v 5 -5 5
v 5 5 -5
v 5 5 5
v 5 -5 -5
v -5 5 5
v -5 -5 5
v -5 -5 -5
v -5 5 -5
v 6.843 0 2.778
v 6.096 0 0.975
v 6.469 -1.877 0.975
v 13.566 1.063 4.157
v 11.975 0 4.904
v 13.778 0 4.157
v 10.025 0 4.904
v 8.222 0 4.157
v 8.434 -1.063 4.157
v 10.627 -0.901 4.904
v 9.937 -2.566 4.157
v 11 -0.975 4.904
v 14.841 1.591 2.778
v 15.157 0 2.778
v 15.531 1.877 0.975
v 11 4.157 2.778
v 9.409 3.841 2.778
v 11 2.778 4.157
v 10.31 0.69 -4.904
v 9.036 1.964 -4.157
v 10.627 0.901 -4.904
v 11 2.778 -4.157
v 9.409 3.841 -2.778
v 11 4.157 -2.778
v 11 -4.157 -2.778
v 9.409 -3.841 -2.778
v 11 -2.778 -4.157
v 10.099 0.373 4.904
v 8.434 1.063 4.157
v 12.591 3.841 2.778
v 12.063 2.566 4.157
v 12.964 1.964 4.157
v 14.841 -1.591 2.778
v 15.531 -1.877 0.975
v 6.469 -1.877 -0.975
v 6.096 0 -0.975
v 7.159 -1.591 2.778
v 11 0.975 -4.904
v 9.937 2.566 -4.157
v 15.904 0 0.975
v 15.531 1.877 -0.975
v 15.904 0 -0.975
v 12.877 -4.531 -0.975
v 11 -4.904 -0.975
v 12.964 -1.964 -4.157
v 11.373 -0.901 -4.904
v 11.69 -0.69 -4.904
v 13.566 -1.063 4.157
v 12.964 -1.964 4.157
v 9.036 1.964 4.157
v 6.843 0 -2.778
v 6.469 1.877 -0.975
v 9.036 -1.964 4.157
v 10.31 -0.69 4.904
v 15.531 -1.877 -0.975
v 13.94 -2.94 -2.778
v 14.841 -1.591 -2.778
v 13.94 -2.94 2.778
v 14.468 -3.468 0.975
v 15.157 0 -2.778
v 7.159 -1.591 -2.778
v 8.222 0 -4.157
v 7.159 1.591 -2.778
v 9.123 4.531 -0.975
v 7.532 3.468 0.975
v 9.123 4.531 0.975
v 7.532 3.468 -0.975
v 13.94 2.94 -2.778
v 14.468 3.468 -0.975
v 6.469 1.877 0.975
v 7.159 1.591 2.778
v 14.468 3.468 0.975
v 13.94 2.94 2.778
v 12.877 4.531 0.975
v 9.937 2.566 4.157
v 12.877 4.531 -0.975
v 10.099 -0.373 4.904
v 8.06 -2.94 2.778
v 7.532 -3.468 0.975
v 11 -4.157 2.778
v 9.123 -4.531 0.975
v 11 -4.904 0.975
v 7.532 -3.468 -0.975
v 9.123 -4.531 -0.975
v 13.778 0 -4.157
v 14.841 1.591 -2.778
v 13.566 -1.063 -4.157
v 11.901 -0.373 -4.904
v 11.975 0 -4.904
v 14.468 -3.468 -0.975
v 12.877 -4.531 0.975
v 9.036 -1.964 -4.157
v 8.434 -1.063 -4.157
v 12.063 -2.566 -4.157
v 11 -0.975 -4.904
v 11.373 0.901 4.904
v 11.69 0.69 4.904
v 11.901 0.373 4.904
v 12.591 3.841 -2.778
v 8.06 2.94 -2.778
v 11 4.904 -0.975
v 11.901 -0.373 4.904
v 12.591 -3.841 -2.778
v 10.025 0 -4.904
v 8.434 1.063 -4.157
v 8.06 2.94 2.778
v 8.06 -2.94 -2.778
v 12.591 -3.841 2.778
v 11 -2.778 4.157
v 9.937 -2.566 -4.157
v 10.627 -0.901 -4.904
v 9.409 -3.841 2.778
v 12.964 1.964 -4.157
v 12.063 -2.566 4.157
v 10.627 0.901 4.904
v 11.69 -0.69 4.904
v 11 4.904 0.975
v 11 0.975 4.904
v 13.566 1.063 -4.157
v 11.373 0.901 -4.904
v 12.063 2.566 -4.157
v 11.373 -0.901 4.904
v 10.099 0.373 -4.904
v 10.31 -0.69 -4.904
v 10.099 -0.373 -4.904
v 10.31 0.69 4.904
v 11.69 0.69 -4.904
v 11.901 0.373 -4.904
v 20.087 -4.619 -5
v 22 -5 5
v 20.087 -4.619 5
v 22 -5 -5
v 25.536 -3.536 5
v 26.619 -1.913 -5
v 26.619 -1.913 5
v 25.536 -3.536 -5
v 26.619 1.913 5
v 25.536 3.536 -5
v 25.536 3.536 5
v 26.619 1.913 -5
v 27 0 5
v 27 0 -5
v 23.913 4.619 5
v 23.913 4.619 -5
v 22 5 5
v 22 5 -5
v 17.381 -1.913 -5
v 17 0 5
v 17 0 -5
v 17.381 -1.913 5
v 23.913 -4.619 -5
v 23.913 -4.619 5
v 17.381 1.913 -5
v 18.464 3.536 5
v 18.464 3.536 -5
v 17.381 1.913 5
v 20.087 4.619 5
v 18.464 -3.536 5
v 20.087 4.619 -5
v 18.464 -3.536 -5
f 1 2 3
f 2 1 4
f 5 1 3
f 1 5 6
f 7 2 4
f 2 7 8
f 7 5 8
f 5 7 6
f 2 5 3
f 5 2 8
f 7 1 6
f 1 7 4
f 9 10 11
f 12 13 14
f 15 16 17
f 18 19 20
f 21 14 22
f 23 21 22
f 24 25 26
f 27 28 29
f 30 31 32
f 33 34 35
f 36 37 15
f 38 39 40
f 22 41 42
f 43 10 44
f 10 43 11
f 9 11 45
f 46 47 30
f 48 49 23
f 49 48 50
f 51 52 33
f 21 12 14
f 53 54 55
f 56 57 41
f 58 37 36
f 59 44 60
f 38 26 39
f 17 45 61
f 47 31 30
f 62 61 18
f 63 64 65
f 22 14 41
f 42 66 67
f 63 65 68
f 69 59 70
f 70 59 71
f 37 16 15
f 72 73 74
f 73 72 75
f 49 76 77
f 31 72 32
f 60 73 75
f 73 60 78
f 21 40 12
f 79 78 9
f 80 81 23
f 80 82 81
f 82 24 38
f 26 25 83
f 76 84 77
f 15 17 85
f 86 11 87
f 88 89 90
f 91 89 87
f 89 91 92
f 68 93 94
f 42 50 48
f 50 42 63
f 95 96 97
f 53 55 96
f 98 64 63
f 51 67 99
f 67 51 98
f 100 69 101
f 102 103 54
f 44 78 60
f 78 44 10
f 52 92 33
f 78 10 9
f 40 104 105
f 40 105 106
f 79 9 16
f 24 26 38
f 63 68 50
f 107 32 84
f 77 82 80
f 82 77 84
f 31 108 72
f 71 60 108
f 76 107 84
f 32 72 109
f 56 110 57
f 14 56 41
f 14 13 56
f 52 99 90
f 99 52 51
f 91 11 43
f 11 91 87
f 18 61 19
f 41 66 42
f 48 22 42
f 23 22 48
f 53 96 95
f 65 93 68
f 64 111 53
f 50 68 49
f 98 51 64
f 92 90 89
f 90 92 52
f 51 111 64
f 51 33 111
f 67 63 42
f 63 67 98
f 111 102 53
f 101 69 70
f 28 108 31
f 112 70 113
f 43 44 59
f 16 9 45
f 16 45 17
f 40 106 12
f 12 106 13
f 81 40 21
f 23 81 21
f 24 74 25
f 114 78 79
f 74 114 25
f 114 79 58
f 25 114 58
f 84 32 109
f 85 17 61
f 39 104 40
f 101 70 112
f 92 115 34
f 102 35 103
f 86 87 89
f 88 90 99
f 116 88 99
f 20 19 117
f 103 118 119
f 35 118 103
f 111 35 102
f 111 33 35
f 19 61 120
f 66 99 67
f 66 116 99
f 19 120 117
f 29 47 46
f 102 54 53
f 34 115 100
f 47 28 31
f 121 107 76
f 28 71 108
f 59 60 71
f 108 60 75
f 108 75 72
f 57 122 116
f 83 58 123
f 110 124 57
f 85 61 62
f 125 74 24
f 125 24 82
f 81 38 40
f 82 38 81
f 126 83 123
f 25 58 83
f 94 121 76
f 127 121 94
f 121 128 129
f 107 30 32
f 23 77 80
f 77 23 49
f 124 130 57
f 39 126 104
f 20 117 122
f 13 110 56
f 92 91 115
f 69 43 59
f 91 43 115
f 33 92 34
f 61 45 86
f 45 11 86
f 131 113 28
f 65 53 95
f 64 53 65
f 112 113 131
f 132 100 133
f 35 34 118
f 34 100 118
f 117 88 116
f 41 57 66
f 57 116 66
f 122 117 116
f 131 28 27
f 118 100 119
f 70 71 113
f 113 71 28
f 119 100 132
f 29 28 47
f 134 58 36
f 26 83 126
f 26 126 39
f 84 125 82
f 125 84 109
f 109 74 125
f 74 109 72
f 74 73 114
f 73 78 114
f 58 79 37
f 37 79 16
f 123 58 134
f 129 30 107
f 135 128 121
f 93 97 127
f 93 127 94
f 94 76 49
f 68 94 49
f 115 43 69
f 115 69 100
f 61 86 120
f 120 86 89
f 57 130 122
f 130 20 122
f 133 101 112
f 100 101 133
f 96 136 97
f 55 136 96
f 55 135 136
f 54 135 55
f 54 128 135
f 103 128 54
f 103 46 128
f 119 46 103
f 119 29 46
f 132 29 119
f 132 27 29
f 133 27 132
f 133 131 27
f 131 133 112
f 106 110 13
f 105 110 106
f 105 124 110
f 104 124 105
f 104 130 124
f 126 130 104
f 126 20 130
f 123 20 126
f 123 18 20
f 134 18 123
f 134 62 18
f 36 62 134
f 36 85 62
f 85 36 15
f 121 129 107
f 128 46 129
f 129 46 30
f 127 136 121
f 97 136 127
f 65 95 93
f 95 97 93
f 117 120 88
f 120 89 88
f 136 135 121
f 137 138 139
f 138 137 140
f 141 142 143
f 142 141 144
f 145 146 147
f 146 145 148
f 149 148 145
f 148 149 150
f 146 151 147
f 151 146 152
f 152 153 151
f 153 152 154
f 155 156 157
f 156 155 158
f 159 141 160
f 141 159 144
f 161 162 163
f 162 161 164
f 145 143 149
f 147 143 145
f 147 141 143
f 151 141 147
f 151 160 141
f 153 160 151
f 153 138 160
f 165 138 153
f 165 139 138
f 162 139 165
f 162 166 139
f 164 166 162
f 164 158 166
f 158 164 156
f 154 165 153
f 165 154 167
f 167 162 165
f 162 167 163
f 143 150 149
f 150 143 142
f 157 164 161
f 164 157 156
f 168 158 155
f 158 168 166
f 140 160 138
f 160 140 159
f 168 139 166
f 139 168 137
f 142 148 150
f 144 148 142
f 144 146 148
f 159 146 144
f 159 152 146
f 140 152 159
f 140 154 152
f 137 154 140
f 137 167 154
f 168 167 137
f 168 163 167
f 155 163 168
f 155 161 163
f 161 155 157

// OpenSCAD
cube(10, center=true);
translate([11,0,0]) sphere(5);
translate([22,0,0]) cylinder(r=5, h=10, center=true);
